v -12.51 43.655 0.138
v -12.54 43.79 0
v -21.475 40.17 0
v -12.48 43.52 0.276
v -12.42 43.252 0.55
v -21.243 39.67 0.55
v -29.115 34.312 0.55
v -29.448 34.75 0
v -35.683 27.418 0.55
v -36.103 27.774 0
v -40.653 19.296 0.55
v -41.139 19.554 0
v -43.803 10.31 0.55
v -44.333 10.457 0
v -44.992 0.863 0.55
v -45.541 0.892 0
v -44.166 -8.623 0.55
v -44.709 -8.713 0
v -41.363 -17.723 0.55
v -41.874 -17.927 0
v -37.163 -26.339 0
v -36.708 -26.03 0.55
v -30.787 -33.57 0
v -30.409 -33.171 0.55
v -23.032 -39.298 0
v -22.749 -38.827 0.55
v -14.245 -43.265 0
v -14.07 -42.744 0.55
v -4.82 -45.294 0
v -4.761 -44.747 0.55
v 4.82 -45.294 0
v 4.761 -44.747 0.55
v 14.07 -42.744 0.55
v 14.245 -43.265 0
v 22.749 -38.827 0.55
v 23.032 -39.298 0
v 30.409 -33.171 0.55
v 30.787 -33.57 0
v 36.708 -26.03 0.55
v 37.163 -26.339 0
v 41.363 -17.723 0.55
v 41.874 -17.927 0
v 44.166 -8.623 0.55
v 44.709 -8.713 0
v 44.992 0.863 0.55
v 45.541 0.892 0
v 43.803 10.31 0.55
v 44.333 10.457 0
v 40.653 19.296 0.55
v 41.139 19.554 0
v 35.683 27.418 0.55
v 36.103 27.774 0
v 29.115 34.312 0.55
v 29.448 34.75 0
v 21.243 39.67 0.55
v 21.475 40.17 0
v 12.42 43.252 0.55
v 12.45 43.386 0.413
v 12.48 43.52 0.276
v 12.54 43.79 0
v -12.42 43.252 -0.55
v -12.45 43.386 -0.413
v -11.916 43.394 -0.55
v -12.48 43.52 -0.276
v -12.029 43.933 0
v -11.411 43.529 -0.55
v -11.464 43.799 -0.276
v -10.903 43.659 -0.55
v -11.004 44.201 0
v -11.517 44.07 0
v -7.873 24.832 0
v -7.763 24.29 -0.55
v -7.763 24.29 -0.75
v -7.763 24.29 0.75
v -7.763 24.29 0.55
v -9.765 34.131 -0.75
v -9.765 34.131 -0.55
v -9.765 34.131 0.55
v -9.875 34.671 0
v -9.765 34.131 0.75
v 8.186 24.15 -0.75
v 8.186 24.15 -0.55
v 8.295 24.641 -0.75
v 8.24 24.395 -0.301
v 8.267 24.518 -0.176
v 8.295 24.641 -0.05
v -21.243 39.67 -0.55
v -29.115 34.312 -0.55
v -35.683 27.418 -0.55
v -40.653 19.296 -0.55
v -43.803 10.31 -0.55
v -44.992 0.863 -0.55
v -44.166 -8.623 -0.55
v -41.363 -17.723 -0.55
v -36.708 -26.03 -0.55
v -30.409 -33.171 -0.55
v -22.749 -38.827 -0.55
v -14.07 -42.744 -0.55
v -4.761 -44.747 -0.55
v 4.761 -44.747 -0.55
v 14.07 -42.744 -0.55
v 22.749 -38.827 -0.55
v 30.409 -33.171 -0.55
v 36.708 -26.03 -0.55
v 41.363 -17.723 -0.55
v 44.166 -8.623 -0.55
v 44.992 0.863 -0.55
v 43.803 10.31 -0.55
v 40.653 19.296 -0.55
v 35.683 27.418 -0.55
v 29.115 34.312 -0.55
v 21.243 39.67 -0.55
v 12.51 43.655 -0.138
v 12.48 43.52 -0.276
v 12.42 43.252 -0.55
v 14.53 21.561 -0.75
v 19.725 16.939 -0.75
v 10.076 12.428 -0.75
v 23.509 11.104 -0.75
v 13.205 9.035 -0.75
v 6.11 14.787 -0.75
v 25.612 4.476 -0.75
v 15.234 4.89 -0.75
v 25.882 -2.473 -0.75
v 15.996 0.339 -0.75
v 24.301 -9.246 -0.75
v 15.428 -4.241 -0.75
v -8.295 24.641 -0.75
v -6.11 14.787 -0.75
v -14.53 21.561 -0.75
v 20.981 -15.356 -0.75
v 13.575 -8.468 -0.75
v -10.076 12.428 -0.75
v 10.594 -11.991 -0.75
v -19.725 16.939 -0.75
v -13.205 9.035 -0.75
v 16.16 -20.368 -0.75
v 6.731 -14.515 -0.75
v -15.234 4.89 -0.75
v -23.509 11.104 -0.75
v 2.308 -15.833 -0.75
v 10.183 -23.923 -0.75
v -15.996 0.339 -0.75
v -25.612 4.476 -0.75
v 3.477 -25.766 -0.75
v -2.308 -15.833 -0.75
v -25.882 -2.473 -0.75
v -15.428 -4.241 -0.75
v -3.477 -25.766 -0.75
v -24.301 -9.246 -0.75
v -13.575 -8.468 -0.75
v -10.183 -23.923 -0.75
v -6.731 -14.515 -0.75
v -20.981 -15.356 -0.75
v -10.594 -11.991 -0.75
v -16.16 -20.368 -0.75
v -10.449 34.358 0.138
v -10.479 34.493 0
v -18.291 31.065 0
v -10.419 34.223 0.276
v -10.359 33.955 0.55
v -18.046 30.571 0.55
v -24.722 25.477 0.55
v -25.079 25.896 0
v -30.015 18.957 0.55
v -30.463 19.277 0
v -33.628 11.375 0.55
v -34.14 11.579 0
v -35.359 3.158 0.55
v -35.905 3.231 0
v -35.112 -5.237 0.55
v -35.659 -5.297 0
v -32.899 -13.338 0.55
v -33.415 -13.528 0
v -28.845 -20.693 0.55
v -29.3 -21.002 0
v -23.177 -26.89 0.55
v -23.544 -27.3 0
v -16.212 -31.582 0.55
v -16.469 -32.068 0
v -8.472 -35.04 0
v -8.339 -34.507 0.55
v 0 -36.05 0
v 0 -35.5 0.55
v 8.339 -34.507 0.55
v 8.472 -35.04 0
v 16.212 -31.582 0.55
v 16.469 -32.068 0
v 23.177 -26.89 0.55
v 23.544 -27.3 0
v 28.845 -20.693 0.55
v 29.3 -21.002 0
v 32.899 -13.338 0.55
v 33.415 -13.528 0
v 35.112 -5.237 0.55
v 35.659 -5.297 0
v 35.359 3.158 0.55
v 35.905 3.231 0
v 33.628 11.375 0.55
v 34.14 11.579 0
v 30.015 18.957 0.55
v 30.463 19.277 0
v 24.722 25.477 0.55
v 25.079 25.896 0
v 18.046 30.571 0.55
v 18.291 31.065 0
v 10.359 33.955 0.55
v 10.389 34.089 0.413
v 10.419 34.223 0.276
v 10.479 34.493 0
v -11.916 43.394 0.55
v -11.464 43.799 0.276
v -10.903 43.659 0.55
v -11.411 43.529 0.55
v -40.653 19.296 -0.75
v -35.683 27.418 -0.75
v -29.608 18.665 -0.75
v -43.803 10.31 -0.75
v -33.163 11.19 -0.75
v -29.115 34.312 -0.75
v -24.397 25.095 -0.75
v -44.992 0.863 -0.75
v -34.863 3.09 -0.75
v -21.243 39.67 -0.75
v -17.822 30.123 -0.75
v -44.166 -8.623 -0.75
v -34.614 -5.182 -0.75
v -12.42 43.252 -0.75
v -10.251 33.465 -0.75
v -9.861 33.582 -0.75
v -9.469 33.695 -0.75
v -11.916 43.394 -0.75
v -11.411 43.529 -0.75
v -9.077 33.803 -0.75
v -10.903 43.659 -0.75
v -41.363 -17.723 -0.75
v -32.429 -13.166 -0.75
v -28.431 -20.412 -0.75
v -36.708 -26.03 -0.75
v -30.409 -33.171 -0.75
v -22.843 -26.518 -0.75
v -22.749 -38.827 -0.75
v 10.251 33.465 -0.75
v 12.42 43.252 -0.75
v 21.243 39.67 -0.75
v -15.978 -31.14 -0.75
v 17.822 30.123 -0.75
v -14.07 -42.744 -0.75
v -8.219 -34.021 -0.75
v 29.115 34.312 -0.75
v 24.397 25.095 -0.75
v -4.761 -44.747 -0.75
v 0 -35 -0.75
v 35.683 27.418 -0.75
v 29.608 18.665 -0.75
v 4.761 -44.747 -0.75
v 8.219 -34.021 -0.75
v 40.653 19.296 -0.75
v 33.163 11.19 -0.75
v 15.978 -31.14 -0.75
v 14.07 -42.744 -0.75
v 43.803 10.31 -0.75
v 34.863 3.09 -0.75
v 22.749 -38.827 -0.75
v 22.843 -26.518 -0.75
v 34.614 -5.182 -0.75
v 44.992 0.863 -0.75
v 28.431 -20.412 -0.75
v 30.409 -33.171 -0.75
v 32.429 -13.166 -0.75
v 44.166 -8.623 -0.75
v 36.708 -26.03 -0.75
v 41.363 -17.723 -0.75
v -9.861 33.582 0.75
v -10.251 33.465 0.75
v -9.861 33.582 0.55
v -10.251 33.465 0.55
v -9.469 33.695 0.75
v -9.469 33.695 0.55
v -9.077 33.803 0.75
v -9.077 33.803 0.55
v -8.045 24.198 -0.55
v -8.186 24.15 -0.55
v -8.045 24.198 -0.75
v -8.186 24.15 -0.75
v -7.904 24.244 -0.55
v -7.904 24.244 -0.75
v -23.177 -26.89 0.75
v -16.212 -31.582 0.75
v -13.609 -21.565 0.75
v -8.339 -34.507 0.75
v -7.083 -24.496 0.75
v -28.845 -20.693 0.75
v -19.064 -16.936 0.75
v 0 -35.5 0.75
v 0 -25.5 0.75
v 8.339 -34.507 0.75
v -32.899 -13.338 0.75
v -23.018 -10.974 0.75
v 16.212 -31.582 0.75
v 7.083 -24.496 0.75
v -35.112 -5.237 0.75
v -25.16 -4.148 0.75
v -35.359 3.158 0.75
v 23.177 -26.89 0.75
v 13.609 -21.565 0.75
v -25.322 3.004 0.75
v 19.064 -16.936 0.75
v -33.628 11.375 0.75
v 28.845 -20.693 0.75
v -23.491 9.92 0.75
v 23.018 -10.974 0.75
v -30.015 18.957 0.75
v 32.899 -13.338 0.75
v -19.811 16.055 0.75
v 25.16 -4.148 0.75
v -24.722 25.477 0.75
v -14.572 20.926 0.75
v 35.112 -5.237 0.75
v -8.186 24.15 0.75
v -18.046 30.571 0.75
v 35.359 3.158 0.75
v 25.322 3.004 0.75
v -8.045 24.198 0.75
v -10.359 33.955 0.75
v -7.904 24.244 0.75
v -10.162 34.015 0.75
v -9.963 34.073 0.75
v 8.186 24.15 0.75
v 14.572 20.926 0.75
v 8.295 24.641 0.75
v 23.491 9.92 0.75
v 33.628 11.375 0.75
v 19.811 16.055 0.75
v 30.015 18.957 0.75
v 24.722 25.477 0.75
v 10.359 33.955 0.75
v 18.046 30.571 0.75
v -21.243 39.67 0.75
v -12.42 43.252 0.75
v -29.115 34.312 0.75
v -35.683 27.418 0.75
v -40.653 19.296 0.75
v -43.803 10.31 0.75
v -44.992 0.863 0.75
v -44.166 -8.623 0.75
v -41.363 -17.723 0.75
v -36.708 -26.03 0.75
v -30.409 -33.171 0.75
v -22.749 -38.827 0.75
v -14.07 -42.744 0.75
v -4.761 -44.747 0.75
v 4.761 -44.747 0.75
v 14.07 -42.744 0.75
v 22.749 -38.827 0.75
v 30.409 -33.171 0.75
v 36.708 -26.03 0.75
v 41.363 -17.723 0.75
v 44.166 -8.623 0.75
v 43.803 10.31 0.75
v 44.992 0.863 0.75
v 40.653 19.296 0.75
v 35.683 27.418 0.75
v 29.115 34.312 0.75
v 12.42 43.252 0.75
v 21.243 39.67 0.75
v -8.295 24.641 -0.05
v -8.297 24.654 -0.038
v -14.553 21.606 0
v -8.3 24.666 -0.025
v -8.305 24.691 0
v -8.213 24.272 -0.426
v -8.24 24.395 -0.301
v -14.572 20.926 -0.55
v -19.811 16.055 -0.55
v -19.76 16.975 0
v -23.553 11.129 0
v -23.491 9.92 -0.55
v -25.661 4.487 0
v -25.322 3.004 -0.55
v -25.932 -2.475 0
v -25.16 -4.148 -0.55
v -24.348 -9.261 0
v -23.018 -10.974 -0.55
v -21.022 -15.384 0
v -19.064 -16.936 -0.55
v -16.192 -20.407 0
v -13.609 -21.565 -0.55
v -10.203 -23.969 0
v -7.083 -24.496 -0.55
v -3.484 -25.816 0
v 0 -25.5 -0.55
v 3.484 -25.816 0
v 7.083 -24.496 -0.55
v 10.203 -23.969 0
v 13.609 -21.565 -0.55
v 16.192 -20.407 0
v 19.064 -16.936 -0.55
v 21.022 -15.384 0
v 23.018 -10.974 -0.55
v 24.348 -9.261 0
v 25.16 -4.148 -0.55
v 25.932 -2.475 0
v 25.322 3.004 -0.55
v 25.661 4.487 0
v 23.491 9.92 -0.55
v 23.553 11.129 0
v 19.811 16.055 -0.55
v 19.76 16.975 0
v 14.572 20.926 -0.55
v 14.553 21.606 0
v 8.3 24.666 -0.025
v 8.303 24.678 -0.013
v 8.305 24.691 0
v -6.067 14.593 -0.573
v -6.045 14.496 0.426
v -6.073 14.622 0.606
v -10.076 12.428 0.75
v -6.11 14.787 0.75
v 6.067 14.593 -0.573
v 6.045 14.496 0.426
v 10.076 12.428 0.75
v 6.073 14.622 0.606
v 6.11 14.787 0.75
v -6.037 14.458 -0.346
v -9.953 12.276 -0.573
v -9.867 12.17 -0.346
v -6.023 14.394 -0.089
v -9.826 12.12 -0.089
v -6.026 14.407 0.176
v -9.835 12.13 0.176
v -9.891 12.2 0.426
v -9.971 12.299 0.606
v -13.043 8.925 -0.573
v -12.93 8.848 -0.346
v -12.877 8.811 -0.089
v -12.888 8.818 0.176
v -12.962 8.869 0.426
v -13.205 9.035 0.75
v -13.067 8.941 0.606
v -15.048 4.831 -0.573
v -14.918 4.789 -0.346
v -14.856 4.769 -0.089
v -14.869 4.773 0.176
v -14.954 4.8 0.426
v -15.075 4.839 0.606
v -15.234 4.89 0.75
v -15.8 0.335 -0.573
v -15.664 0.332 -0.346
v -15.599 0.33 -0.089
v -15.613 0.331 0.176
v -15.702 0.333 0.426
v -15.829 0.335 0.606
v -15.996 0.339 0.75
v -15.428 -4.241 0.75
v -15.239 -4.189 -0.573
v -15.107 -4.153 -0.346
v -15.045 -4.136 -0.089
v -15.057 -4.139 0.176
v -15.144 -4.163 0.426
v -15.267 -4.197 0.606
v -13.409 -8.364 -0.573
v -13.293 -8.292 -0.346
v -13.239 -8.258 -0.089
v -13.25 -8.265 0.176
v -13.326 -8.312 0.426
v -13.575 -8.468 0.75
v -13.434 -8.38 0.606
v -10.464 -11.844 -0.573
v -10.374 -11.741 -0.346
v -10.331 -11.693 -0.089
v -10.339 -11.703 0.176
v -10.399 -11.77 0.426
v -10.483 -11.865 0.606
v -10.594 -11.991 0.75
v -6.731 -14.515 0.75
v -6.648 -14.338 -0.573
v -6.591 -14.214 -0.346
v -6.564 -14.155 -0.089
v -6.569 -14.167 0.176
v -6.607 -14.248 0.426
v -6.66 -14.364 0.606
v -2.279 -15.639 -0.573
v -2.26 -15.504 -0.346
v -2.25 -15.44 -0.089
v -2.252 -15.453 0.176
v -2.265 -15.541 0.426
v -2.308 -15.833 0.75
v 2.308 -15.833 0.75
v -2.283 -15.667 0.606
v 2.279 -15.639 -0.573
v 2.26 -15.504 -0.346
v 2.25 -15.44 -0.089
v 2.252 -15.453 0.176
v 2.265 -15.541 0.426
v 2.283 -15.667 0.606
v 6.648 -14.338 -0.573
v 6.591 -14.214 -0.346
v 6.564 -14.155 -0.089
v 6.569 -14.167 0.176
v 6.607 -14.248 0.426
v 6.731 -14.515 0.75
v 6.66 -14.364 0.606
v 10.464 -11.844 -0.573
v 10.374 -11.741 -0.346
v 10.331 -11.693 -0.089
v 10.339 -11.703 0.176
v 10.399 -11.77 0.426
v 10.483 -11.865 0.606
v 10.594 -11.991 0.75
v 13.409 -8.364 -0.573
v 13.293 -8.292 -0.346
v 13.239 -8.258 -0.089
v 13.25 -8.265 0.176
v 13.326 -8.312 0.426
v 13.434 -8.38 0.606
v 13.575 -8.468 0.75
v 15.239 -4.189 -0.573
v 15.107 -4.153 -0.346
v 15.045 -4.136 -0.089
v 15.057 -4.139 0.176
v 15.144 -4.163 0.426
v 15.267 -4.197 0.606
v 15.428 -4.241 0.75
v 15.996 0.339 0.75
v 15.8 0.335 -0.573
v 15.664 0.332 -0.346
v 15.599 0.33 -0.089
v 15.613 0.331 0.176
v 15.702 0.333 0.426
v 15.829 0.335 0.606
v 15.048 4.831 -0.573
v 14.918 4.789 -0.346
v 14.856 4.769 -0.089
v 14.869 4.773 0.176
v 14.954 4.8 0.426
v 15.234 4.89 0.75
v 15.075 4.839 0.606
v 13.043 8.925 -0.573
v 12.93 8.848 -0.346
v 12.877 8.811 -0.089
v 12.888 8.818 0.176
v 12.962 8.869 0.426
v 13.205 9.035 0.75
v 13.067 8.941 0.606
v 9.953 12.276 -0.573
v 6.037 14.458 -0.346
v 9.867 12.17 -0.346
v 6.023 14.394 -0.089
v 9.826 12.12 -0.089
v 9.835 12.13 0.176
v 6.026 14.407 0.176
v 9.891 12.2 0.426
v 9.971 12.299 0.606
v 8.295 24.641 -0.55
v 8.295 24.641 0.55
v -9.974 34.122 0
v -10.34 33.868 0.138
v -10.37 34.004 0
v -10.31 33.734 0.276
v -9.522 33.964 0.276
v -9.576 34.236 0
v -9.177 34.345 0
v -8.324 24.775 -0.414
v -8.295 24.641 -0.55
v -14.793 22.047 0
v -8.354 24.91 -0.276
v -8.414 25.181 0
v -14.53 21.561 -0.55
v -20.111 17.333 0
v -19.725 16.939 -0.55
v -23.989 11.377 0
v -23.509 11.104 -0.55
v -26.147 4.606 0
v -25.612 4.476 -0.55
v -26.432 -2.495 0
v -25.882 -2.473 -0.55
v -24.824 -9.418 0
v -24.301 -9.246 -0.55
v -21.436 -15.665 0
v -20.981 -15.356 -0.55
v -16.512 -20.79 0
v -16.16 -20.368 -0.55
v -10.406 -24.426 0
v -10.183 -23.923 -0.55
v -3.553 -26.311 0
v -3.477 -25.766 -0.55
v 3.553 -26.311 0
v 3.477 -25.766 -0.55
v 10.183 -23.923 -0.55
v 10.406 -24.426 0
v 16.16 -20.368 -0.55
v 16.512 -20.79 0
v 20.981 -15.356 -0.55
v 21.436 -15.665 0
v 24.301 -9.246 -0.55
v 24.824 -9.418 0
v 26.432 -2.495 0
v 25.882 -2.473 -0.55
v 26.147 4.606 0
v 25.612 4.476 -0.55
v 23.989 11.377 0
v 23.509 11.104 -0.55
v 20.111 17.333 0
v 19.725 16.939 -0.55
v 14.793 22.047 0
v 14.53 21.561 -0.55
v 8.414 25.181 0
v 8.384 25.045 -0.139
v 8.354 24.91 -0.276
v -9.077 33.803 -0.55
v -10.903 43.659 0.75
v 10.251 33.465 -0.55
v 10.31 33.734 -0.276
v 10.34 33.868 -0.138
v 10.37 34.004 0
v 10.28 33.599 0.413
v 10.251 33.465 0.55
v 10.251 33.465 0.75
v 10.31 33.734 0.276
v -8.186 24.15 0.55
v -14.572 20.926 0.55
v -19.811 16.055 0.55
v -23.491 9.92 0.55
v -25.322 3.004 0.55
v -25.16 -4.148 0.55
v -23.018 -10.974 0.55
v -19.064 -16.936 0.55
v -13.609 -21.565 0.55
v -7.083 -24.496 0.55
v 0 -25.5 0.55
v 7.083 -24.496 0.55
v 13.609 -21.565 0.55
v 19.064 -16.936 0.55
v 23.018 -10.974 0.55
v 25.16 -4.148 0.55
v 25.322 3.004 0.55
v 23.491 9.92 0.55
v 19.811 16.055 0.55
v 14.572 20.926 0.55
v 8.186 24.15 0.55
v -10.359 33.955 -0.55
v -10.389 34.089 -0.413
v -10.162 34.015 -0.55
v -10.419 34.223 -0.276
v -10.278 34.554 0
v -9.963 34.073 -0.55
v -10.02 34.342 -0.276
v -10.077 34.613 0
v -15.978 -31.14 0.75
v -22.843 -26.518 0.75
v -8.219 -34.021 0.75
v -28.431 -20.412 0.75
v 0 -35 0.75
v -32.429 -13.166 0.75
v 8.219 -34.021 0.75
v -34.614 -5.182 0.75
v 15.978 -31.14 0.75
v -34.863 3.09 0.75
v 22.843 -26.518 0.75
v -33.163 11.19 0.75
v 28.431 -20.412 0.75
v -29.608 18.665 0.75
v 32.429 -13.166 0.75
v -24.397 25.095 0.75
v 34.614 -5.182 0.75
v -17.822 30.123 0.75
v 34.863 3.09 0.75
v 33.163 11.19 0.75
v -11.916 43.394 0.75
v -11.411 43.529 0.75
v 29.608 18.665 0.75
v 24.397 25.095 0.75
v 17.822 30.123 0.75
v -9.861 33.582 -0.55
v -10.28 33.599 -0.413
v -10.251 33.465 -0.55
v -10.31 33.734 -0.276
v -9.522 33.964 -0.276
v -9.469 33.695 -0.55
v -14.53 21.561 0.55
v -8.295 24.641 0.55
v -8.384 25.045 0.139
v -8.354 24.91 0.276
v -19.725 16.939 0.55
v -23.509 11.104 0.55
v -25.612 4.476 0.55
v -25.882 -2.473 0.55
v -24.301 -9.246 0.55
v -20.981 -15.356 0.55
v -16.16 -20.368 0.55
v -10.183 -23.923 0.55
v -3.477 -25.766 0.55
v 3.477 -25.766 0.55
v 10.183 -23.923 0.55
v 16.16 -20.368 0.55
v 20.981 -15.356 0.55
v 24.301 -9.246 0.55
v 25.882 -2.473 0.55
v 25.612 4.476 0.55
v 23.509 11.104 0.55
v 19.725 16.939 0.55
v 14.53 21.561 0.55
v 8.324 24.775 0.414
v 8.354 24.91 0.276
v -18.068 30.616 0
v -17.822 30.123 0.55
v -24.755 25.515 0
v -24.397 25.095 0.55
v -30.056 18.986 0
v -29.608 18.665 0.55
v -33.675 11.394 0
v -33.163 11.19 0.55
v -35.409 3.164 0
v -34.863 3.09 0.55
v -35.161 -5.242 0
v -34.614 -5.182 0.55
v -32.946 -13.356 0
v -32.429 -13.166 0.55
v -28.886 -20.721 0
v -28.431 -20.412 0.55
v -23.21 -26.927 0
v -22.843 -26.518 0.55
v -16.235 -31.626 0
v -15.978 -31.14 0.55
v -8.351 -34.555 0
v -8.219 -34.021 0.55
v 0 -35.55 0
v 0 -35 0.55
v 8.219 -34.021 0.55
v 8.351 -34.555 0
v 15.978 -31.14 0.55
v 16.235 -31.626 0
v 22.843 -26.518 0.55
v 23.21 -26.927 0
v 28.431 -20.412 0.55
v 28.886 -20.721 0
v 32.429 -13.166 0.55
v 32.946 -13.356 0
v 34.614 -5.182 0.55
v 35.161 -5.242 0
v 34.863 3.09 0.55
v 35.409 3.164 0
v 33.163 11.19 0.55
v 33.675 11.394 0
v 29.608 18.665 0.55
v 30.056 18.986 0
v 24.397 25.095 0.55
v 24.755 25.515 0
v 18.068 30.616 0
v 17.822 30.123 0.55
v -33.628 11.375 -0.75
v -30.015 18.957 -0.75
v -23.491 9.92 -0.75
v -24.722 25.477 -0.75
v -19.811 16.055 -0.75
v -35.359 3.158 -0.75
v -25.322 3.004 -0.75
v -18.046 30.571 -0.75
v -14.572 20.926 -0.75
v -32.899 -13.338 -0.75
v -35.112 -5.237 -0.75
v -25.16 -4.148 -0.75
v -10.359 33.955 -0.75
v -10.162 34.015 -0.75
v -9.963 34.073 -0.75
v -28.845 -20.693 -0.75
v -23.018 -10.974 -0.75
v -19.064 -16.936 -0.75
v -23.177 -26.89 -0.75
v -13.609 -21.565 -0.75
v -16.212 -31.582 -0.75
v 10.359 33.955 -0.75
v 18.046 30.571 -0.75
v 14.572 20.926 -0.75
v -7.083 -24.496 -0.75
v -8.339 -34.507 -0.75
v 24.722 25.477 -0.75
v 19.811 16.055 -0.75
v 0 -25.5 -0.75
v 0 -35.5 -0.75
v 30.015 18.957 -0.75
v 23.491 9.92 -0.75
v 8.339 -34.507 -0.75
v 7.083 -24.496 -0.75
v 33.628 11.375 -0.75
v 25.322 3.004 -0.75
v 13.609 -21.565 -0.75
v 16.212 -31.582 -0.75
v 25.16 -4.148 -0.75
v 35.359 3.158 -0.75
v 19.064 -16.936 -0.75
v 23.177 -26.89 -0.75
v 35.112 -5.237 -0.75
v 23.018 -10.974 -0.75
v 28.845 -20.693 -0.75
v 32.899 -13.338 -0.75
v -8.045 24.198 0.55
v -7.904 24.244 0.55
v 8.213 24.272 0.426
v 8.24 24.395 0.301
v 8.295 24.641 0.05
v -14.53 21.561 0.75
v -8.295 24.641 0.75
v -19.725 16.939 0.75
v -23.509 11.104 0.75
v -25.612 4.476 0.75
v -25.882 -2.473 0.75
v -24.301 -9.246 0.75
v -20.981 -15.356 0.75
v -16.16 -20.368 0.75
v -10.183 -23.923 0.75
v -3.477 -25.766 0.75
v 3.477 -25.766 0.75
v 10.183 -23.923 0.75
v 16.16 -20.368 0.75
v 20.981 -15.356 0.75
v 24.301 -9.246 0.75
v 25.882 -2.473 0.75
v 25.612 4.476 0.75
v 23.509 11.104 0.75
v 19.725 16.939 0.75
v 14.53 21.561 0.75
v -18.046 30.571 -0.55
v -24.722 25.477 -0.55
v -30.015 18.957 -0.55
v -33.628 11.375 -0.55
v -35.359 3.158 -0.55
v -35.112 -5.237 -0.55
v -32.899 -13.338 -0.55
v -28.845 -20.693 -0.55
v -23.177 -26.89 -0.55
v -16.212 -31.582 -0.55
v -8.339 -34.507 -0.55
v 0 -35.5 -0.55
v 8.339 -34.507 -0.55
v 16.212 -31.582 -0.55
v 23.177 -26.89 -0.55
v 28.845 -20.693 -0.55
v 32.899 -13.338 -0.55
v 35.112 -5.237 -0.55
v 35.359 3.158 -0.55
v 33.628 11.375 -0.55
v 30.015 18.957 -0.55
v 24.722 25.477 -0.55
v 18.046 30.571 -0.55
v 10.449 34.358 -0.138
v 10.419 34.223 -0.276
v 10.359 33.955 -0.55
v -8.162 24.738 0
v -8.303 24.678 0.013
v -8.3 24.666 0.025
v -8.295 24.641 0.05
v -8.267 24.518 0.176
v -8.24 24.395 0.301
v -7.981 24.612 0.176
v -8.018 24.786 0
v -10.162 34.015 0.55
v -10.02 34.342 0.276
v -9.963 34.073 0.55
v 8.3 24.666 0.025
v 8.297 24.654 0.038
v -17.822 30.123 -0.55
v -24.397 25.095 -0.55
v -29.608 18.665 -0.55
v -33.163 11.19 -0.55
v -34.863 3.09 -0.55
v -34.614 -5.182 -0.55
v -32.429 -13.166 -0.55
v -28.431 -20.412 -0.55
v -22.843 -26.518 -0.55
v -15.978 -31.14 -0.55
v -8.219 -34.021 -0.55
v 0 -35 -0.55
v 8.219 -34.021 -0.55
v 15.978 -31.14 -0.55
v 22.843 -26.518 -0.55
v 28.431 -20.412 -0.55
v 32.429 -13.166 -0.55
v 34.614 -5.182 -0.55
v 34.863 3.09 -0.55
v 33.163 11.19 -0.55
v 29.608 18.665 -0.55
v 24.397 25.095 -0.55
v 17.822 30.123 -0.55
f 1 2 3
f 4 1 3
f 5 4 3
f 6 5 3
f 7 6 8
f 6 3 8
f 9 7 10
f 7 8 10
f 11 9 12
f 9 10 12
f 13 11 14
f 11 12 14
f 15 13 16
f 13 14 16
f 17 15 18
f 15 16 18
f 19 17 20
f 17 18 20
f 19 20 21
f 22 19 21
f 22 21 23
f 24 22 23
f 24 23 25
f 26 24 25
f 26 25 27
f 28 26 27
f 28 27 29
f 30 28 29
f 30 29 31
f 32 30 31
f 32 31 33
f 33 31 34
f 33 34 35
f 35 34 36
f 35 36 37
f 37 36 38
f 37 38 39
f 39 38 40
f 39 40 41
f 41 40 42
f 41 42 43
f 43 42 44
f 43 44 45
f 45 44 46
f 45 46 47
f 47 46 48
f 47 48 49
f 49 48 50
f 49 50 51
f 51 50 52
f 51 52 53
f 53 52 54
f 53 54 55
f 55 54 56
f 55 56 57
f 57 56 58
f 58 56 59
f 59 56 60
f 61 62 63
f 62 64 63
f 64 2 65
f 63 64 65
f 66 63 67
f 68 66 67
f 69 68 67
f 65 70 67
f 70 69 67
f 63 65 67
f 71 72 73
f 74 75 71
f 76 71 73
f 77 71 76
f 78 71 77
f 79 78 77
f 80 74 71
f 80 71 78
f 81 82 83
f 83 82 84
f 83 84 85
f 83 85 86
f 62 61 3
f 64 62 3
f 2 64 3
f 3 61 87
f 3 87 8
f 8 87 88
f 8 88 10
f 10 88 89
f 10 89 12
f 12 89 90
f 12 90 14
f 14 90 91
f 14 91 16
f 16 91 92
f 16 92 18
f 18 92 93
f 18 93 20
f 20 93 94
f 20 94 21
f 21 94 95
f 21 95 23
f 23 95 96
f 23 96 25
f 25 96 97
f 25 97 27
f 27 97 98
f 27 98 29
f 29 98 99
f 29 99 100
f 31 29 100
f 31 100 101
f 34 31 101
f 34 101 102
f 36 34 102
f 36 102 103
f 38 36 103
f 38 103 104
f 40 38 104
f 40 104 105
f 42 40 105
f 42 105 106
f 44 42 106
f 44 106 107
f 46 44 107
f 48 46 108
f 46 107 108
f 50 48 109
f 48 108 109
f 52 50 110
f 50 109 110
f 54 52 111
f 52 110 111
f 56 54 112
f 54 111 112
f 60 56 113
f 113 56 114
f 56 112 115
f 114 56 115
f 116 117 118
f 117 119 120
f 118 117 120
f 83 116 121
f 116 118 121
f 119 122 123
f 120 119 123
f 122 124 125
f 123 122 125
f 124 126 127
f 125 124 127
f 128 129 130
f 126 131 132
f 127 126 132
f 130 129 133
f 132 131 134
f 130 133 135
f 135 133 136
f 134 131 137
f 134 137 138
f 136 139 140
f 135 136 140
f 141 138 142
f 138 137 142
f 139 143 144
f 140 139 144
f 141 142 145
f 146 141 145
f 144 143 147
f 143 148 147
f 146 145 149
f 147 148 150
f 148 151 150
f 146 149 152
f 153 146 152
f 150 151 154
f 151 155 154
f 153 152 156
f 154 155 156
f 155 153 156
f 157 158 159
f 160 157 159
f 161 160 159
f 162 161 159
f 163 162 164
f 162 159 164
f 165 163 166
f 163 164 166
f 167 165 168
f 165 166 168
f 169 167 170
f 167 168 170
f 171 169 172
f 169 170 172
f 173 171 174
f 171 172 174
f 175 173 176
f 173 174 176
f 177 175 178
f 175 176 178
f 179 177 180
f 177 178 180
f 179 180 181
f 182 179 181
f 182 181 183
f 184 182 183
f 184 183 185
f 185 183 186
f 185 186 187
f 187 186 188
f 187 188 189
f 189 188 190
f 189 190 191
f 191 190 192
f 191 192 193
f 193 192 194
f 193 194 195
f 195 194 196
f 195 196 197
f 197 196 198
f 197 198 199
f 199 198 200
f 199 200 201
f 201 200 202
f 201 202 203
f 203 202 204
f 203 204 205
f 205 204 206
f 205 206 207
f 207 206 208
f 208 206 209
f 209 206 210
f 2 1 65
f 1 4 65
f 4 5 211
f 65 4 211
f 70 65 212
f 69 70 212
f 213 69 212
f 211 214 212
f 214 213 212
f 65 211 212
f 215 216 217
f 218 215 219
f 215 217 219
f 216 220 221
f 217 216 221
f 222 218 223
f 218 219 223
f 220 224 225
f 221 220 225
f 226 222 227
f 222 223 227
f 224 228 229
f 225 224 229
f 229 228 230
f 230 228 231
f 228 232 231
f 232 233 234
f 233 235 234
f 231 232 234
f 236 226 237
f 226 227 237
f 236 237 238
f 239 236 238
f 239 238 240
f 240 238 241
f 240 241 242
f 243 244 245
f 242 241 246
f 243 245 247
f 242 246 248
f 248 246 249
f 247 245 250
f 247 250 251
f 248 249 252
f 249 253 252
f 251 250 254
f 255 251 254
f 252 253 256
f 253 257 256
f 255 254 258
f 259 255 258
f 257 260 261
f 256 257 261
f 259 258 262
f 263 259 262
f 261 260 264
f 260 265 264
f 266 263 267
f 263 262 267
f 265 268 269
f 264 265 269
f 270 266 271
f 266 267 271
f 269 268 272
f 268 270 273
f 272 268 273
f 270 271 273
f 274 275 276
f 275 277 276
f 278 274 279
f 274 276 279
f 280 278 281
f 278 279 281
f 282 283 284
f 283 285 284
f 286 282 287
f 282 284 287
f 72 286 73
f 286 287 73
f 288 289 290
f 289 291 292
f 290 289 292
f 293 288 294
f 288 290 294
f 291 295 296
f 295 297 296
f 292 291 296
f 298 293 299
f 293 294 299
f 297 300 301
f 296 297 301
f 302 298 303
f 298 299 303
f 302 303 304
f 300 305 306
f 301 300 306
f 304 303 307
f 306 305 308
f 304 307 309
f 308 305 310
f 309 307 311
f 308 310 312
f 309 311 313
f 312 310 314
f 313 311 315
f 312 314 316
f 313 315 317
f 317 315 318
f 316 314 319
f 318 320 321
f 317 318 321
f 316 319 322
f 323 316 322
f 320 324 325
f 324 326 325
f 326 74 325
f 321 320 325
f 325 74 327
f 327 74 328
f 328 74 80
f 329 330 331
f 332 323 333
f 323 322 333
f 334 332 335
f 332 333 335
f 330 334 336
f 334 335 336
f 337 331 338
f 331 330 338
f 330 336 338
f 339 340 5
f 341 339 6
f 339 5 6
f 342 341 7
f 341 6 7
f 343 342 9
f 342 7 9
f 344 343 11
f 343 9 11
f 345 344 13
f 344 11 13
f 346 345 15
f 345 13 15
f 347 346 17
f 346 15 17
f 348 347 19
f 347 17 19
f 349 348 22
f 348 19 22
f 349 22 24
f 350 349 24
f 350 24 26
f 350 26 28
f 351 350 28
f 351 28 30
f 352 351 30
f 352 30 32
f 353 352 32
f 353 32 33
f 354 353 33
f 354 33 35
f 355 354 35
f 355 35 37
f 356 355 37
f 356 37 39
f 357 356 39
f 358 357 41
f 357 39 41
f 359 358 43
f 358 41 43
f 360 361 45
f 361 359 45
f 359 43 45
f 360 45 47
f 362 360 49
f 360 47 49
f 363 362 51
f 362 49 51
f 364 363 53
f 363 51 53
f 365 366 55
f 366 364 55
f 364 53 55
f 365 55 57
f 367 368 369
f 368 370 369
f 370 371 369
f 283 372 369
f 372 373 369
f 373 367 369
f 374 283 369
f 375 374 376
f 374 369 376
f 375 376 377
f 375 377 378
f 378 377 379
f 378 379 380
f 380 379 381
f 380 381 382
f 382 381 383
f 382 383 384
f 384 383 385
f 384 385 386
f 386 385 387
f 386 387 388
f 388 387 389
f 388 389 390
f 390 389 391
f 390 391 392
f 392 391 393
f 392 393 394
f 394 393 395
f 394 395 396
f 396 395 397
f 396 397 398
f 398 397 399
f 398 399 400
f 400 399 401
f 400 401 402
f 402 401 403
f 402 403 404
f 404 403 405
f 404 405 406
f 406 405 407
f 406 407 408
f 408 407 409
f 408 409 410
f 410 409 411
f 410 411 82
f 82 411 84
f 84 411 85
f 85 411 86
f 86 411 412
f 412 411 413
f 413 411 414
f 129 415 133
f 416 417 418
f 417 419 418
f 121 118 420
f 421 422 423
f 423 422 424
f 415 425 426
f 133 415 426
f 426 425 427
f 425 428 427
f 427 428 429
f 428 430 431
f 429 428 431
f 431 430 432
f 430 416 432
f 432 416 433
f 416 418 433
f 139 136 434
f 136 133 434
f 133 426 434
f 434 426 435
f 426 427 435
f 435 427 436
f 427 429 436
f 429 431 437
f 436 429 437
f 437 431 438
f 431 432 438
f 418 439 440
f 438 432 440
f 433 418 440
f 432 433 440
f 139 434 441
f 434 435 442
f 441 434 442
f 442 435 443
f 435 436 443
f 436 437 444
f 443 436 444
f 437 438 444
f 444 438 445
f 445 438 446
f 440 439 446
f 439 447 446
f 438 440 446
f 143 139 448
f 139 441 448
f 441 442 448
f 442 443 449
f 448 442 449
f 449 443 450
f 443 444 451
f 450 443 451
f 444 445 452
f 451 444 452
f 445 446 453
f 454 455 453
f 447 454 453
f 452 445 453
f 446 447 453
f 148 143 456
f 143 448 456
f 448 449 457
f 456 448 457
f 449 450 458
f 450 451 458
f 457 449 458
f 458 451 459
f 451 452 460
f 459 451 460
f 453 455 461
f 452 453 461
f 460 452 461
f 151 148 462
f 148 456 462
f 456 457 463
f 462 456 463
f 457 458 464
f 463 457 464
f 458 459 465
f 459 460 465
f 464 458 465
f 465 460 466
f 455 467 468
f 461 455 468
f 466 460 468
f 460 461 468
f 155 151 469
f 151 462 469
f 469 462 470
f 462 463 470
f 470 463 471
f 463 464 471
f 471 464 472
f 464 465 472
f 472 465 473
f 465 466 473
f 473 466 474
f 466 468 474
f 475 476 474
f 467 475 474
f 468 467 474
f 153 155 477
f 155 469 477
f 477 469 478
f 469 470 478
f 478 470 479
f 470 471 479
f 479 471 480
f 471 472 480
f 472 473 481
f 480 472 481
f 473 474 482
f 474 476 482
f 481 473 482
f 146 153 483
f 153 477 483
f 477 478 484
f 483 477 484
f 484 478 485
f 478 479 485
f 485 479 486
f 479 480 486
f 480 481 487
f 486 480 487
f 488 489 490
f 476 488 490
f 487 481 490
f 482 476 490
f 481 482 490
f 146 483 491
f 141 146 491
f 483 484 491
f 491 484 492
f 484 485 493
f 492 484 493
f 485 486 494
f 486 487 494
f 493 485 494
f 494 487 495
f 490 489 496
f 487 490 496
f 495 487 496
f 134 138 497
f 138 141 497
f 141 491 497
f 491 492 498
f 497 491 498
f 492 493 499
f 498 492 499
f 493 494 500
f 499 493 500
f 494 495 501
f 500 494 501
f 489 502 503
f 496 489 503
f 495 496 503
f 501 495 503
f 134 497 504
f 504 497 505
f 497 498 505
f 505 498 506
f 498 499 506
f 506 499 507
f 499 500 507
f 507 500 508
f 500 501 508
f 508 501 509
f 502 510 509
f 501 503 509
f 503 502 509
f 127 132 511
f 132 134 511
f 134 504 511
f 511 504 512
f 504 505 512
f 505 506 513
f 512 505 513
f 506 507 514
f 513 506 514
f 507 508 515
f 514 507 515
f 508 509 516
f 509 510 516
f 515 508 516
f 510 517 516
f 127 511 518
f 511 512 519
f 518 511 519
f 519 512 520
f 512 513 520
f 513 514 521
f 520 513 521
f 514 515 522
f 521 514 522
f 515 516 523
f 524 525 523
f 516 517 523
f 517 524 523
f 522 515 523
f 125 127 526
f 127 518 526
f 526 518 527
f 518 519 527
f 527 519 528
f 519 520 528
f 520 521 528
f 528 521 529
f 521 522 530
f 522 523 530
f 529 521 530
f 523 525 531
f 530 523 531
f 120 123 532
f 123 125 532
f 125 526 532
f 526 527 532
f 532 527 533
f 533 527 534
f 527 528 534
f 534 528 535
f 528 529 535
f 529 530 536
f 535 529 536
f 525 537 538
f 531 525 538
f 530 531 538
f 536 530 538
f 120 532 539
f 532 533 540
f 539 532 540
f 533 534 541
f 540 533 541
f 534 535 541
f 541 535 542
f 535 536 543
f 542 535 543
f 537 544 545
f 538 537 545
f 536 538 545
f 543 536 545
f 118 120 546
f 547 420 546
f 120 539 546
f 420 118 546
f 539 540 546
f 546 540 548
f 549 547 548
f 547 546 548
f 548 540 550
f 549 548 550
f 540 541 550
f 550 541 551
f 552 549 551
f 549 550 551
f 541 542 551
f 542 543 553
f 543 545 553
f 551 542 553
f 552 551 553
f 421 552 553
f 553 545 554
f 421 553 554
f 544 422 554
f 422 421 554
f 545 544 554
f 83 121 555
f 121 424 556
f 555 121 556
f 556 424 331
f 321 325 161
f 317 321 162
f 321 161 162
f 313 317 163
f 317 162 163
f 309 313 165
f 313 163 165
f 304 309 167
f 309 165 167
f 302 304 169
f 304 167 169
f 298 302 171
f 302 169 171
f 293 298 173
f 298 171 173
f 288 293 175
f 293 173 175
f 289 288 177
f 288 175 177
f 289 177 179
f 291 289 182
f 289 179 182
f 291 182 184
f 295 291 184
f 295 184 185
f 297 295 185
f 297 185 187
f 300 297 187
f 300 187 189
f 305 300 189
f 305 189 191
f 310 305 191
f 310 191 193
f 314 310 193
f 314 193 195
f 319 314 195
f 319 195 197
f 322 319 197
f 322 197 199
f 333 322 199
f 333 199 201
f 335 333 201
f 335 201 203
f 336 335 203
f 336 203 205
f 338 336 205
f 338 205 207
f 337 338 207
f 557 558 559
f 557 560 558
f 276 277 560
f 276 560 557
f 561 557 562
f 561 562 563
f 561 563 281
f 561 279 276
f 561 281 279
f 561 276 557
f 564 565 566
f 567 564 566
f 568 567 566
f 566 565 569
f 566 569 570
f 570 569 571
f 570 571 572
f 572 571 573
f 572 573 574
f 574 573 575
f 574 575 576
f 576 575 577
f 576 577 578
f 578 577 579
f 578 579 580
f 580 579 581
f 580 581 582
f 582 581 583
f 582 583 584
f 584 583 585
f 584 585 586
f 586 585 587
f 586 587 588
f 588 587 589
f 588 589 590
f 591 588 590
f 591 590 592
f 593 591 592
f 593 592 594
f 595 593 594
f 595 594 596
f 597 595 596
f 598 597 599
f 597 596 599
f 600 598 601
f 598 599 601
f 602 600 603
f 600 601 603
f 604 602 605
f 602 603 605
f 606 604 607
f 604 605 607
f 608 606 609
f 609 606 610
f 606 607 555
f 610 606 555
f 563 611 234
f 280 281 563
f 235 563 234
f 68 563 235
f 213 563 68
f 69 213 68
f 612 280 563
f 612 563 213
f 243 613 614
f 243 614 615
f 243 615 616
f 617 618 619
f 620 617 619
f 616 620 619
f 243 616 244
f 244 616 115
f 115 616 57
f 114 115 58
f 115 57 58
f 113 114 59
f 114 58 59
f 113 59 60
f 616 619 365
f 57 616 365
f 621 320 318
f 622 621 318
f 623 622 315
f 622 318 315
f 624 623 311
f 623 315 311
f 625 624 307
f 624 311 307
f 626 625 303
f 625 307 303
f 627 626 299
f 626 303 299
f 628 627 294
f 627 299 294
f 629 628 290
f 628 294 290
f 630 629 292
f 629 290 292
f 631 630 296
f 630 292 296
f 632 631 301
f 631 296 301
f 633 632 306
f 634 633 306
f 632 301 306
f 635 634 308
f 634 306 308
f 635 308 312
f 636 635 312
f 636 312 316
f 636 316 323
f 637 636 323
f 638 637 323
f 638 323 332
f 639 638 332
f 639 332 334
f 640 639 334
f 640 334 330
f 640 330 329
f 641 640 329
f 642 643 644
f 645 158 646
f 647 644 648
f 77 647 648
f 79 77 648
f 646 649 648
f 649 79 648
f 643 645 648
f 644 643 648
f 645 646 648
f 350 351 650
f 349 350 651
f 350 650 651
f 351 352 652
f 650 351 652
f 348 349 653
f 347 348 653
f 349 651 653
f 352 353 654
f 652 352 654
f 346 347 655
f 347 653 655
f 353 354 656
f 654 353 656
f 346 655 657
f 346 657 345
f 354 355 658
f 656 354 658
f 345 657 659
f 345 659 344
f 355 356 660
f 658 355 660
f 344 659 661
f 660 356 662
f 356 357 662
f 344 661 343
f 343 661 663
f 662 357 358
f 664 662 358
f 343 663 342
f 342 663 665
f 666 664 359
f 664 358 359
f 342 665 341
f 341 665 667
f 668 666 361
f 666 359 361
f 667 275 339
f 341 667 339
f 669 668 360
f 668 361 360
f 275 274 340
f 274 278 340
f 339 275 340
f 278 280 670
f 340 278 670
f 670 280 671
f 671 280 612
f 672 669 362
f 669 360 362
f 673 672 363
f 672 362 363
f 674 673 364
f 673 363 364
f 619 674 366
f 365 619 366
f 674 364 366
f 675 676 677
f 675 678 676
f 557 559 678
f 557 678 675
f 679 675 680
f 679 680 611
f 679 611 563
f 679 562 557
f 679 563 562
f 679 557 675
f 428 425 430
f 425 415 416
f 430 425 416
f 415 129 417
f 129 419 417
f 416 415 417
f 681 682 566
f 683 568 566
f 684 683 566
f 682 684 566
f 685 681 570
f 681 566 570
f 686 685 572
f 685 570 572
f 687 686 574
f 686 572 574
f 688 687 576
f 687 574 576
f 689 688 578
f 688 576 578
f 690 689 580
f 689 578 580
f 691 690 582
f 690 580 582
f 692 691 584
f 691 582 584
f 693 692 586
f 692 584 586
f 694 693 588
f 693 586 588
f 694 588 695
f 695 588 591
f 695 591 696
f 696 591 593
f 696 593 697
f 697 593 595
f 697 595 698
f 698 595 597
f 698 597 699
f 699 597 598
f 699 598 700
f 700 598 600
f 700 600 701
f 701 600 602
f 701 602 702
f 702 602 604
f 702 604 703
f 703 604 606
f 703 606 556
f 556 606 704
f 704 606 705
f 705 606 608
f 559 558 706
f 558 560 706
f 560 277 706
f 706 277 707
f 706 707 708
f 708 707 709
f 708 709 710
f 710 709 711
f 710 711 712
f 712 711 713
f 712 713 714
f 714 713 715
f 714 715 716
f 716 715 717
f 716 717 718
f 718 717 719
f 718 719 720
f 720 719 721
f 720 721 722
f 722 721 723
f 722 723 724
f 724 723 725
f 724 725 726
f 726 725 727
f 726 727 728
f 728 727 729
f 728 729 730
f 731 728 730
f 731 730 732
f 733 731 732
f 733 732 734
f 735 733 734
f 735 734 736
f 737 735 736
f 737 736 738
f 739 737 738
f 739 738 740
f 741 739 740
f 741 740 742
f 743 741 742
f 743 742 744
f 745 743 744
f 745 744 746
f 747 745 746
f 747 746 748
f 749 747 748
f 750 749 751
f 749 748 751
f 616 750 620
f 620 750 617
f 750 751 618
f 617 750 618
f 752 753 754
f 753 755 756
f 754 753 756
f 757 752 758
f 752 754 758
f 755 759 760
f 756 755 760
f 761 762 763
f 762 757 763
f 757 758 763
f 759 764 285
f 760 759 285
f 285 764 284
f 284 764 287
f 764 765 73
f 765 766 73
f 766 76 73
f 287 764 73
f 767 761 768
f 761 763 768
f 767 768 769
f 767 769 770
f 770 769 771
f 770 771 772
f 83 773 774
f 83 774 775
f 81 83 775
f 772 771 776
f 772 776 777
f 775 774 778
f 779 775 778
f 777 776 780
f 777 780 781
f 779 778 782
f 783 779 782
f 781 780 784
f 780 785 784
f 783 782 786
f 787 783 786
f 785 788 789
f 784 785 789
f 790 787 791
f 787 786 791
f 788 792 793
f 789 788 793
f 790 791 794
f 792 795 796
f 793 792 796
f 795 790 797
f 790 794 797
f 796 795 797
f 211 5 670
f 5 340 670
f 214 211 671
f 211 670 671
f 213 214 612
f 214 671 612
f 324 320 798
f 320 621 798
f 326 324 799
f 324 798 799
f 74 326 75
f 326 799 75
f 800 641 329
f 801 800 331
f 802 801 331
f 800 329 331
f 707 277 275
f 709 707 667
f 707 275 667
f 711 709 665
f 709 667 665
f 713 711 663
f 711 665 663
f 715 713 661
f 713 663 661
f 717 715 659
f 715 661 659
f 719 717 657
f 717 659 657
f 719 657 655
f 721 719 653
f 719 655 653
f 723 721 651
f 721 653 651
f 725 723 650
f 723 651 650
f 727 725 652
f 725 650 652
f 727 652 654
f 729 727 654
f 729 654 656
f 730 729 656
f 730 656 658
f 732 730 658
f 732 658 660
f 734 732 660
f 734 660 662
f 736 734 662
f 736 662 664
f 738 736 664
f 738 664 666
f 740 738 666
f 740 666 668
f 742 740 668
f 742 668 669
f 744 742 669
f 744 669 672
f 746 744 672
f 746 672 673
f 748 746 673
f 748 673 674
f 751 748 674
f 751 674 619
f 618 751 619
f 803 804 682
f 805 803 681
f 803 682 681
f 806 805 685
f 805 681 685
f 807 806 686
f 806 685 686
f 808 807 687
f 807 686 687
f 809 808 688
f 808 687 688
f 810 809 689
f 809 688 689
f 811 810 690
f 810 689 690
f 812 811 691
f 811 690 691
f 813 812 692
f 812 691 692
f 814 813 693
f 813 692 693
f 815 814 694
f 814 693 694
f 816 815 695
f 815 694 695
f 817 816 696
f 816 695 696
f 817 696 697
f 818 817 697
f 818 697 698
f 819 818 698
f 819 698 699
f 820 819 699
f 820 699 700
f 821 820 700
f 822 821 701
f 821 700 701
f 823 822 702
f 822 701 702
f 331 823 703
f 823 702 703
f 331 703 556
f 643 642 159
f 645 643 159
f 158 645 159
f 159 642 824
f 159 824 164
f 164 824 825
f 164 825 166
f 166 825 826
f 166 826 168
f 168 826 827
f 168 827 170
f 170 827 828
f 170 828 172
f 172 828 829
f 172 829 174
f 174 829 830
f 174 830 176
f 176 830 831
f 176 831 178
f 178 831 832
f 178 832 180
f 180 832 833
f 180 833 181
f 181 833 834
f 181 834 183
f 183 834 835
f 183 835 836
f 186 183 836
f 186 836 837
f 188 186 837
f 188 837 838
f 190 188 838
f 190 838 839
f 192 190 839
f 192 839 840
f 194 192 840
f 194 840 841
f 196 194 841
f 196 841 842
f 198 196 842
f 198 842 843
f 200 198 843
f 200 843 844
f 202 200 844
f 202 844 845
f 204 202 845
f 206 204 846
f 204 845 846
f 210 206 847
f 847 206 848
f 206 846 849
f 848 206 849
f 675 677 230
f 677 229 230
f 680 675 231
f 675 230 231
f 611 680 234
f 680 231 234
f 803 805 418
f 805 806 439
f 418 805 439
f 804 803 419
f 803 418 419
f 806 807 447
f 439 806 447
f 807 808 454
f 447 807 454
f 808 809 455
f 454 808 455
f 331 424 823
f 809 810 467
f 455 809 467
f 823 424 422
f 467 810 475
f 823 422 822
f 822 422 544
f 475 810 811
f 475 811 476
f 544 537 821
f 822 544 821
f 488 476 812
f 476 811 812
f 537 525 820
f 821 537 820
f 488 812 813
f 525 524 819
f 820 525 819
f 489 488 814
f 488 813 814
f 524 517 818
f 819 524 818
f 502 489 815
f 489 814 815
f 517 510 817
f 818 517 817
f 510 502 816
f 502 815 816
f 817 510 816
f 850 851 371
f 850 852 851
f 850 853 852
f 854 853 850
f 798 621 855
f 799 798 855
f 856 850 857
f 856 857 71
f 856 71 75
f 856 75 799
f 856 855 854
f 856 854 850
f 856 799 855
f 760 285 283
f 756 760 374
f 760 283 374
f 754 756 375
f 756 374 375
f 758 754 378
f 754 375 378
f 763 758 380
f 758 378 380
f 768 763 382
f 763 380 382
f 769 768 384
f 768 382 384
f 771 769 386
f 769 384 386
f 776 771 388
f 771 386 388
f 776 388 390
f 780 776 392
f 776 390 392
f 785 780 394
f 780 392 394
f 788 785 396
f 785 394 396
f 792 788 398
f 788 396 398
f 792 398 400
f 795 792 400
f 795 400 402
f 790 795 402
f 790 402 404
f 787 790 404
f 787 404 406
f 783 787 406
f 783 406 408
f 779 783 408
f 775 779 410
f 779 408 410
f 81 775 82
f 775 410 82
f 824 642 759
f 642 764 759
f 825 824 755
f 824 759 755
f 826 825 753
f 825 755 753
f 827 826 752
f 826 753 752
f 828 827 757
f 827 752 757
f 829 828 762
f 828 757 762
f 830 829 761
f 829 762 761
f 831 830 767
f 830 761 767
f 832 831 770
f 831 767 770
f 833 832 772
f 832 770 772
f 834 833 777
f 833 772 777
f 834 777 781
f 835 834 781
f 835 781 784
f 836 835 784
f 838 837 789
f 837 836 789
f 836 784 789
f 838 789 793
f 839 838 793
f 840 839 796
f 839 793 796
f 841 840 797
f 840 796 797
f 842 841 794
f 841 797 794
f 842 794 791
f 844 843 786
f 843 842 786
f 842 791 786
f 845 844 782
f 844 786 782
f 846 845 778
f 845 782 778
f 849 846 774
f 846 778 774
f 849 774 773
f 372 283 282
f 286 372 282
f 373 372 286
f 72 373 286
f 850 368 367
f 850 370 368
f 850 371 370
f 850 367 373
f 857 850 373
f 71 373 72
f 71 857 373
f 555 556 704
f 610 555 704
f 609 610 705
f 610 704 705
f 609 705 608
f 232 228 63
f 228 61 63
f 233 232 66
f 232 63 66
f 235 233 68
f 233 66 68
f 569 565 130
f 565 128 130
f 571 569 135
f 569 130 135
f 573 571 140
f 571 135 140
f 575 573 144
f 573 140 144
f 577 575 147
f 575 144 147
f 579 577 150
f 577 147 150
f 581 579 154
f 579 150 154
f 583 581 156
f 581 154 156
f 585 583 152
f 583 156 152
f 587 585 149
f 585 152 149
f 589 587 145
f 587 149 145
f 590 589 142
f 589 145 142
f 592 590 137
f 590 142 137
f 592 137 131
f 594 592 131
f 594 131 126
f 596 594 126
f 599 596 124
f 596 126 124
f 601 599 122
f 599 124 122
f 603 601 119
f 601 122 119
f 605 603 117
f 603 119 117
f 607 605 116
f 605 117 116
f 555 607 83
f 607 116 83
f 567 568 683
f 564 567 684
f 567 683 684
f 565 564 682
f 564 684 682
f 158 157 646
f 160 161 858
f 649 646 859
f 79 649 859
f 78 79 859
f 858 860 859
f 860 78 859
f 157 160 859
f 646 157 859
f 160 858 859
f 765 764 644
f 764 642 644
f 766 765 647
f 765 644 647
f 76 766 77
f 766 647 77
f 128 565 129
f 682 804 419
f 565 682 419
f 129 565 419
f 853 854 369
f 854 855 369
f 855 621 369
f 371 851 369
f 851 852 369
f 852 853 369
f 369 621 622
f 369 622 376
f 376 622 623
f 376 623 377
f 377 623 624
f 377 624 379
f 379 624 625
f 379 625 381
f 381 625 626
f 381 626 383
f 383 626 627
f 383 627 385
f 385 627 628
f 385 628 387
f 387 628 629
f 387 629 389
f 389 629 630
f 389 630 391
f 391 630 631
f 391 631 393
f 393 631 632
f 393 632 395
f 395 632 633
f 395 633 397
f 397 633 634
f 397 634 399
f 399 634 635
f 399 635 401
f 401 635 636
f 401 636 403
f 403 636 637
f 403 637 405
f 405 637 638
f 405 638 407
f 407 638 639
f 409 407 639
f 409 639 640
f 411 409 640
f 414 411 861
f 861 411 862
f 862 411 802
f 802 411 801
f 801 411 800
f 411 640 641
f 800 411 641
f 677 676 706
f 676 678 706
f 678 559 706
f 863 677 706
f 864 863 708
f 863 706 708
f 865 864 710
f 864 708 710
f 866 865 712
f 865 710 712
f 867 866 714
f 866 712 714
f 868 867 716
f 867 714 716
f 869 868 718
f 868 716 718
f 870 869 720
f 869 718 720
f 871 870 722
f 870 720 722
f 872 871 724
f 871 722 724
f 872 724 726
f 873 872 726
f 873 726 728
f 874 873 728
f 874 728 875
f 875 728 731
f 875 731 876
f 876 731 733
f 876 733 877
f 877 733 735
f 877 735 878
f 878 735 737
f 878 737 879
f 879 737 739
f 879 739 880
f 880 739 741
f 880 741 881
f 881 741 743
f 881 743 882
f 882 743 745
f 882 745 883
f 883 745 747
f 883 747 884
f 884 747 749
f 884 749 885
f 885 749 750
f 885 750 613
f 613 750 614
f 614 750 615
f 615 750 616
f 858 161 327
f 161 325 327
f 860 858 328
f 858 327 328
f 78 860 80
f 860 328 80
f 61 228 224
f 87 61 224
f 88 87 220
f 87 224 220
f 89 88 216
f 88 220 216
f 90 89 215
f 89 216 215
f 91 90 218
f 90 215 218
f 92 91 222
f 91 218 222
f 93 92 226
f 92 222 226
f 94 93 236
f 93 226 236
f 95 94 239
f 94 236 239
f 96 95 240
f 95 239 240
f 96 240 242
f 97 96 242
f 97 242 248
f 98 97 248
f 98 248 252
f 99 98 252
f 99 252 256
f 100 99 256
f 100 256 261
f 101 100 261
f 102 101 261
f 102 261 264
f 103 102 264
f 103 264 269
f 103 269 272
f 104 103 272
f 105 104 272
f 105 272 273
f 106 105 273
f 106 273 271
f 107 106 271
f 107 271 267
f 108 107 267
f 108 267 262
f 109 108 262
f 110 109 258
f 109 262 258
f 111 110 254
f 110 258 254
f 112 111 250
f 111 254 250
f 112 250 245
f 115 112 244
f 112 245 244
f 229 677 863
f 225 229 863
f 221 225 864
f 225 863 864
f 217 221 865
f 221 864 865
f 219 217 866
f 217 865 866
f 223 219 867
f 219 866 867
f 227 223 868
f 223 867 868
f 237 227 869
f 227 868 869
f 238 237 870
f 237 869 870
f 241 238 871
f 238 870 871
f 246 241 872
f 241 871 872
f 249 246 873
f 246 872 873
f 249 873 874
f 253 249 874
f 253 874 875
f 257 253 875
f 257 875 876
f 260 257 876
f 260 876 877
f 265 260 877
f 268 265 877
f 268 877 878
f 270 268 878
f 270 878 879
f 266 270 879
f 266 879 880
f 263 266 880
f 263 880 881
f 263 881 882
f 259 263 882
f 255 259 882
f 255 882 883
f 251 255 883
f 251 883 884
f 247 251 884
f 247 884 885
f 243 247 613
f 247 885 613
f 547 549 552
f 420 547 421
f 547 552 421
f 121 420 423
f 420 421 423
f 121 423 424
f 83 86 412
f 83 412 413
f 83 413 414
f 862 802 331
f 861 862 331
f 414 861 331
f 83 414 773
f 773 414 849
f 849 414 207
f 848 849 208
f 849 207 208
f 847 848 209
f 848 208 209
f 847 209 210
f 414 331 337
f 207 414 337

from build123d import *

# Parameters (mm, degrees)
F5_DEPTH = 1.5
F6_ANGLE = 1
F7_ANGLE = 2


with BuildPart() as f1:
    # F0 (on Front) → F1 (revolve)
    with BuildSketch(Plane.XZ):
        with BuildLine():
            Line((-16, 0.75), (-25.5, 0.75))
            Line((-25.5, 0.75), (-25.5, 0.55))
            Line((-25.5, 0.55), (-26.05, 0))
            Line((-26.05, 0), (-25.5, -0.55))
            Line((-25.5, -0.55), (-25.5, -0.75))
            Line((-25.5, -0.75), (-16, -0.75))
            ThreePointArc((-16, -0.75), (-15.5986121811, 0), (-16, 0.75))
        make_face()
        Polygon((-25.5, 0.75), (-26, 0.75), (-26, 0.55), (-26.55, 0), (-26, -0.55), (-26, -0.75), (-25.5, -0.75), (-25.5, -0.55), (-26.05, 0), (-25.5, 0.55), align=None)
    revolve(axis=Axis((0, 0, 8.4824059159), (0, 0, 1)))


with BuildPart() as f2:
    # F0 (on Front) → F2 (revolve)
    with BuildSketch(Plane.XZ):
        Polygon((-26, 0.75), (-35, 0.75), (-35, 0.55), (-35.55, 0), (-35, -0.55), (-35, -0.75), (-26, -0.75), (-26, -0.55), (-26.55, 0), (-26, 0.55), align=None)
        Polygon((-25.5, 0.75), (-26, 0.75), (-26, 0.55), (-26.55, 0), (-26, -0.55), (-26, -0.75), (-25.5, -0.75), (-25.5, -0.55), (-26.05, 0), (-25.5, 0.55), align=None)
        Polygon((-35, 0.75), (-35.5, 0.75), (-35.5, 0.55), (-36.05, 0), (-35.5, -0.55), (-35.5, -0.75), (-35, -0.75), (-35, -0.55), (-35.55, 0), (-35, 0.55), align=None)
    revolve(axis=Axis((0, 0, 8.4824059159), (0, 0, 1)))


with BuildPart() as f3:
    # F0 (on Front) → F3 (revolve)
    with BuildSketch(Plane.XZ):
        Polygon((-35.5, 0.75), (-45, 0.75), (-45, 0.55), (-45.55, 0), (-45, -0.55), (-45, -0.75), (-35.5, -0.75), (-35.5, -0.55), (-36.05, 0), (-35.5, 0.55), align=None)
        Polygon((-35, 0.75), (-35.5, 0.75), (-35.5, 0.55), (-36.05, 0), (-35.5, -0.55), (-35.5, -0.75), (-35, -0.75), (-35, -0.55), (-35.55, 0), (-35, 0.55), align=None)
    revolve(axis=Axis((0, 0, 8.4824059159), (0, 0, 1)))


with BuildPart() as f5_tool:
    # F4 (on face) → F5 (new body, through all)
    with BuildSketch(Plane.XY.offset(0.75)):
        with BuildLine():
            Line((-8.2945057155, 24.6414523707), (-6.1099268561, 14.7874539327))
            ThreePointArc((-6.1099268561, 14.7874539327), (0, 16), (6.1099268561, 14.7874539327))
            Line((6.1099268561, 14.7874539327), (8.2945057155, 24.6414523707))
            ThreePointArc((8.2945057155, 24.6414523707), (0, 26), (-8.2945057155, 24.6414523707))
        make_face()
        with BuildLine():
            Line((-6.1099268561, 14.7874539327), (-6, 14.291605928))
            ThreePointArc((-6, 14.291605928), (0, 15.5), (6, 14.291605928))
            Line((6, 14.291605928), (6.1099268561, 14.7874539327))
            ThreePointArc((6.1099268561, 14.7874539327), (0, 16), (-6.1099268561, 14.7874539327))
        make_face()
        with BuildLine():
            Line((-12.5396268012, 43.7899561508), (-8.2945057155, 24.6414523707))
            ThreePointArc((-8.2945057155, 24.6414523707), (0, 26), (8.2945057155, 24.6414523707))
            Line((8.2945057155, 24.6414523707), (12.5396268012, 43.7899561508))
            ThreePointArc((12.5396268012, 43.7899561508), (0, 45.55), (-12.5396268012, 43.7899561508))
        make_face()
    extrude(amount=-F5_DEPTH)


with BuildPart() as f1_1:
    add(f1.part)

    # F5: cut by f5_tool
    add(f5_tool.part, mode=Mode.SUBTRACT)


with BuildPart() as f2_1:
    add(f2.part)

    # F5: cut by f5_tool
    add(f5_tool.part, mode=Mode.SUBTRACT)

    # F5_face (on face) → F6 (revolve)
    with BuildSketch(Plane(origin=(-9.3162931707, 29.2504377339, 0), x_dir=(-0.2164396139, 0.9762960071, 0), z_dir=(0.9762960071, 0.2164396139, 0))):
        with BuildLine():
            Line((4.8186950678, 0.75), (-5.223796234, 0.75))
            Line((-5.223796234, 0.75), (-5.223796234, 0.55))
            add(Edge.make_bspline(
                [(-4.6706047852, 0), (-4.9501515794, 0.2779681938), (-5.223796234, 0.55)],
                knots=[-2.9334753636, -2.9334753636, -2.9334753636, -2.9120122138, -2.9120122138, -2.9120122138], degree=2, weights=[1, 1.0000575839, 1]))
            add(Edge.make_bspline(
                [(-5.223796234, -0.55), (-4.9501515794, -0.2779681938), (-4.6706047852, 0)],
                knots=[2.9120122138, 2.9120122138, 2.9120122138, 2.9334753636, 2.9334753636, 2.9334753636], degree=2, weights=[1, 1.0000575839, 1]))
            Line((-5.223796234, -0.55), (-5.223796234, -0.75))
            Line((-5.223796234, -0.75), (4.8186950678, -0.75))
            Line((4.8186950678, -0.75), (4.8186950678, -0.55))
            add(Edge.make_bspline(
                [(4.8186950678, -0.55), (5.092399633, -0.2771266059), (5.3703446915, 0)],
                knots=[3.2442982582, 3.2442982582, 3.2442982582, 3.2597185393, 3.2597185393, 3.2597185393], degree=2, weights=[1, 1.0000297233, 1]))
            add(Edge.make_bspline(
                [(5.3703446915, 0), (5.092399633, 0.2771266059), (4.8186950678, 0.55)],
                knots=[-3.2597185393, -3.2597185393, -3.2597185393, -3.2442982582, -3.2442982582, -3.2442982582], degree=2, weights=[1, 1.0000297233, 1]))
            Line((4.8186950678, 0.55), (4.8186950678, 0.75))
        make_face()
    revolve(axis=Axis((0, 0, 8.4824059159), (0, 0, -1)), revolution_arc=F6_ANGLE)


with BuildPart() as f3_1:
    add(f3.part)

    # F5: cut by f5_tool
    add(f5_tool.part, mode=Mode.SUBTRACT)

    # F5_face (on face) → F7 (revolve)
    with BuildSketch(Plane(origin=(-9.3162931707, 29.2504377339, 0), x_dir=(-0.2164396139, 0.9762960071, 0), z_dir=(0.9762960071, 0.2164396139, 0))):
        with BuildLine():
            add(Edge.make_bspline(
                [(14.8925308624, 0), (14.6153432848, 0.2766765991), (14.3415026483, 0.55)],
                knots=[-3.4941735673, -3.4941735673, -3.4941735673, -3.4820027221, -3.4820027221, -3.4820027221], degree=2, weights=[1, 1.0000185162, 1]))
            Line((14.3415026483, 0.55), (14.3415026483, 0.75))
            Line((14.3415026483, 0.75), (4.3171502115, 0.75))
            Line((4.3171502115, 0.75), (4.3171502115, 0.55))
            add(Edge.make_bspline(
                [(4.8688471524, 0), (4.5908481978, 0.2771571192), (4.3171502115, 0.55)],
                knots=[-3.245709999, -3.245709999, -3.245709999, -3.2300697953, -3.2300697953, -3.2300697953], degree=2, weights=[1, 1.0000305772, 1]))
            add(Edge.make_bspline(
                [(4.3171502115, -0.55), (4.5908481978, -0.2771571192), (4.8688471524, 0)],
                knots=[3.2300697953, 3.2300697953, 3.2300697953, 3.245709999, 3.245709999, 3.245709999], degree=2, weights=[1, 1.0000305772, 1]))
            Line((4.3171502115, -0.55), (4.3171502115, -0.75))
            Line((4.3171502115, -0.75), (14.3415026483, -0.75))
            Line((14.3415026483, -0.75), (14.3415026483, -0.55))
            add(Edge.make_bspline(
                [(14.3415026483, -0.55), (14.6153432848, -0.2766765991), (14.8925308624, 0)],
                knots=[3.4820027221, 3.4820027221, 3.4820027221, 3.4941735673, 3.4941735673, 3.4941735673], degree=2, weights=[1, 1.0000185162, 1]))
        make_face()
    revolve(axis=Axis((0, 0, 8.4824059159), (0, 0, -1)), revolution_arc=F7_ANGLE)


solid = Compound([f1_1.part, f2_1.part, f3_1.part])
